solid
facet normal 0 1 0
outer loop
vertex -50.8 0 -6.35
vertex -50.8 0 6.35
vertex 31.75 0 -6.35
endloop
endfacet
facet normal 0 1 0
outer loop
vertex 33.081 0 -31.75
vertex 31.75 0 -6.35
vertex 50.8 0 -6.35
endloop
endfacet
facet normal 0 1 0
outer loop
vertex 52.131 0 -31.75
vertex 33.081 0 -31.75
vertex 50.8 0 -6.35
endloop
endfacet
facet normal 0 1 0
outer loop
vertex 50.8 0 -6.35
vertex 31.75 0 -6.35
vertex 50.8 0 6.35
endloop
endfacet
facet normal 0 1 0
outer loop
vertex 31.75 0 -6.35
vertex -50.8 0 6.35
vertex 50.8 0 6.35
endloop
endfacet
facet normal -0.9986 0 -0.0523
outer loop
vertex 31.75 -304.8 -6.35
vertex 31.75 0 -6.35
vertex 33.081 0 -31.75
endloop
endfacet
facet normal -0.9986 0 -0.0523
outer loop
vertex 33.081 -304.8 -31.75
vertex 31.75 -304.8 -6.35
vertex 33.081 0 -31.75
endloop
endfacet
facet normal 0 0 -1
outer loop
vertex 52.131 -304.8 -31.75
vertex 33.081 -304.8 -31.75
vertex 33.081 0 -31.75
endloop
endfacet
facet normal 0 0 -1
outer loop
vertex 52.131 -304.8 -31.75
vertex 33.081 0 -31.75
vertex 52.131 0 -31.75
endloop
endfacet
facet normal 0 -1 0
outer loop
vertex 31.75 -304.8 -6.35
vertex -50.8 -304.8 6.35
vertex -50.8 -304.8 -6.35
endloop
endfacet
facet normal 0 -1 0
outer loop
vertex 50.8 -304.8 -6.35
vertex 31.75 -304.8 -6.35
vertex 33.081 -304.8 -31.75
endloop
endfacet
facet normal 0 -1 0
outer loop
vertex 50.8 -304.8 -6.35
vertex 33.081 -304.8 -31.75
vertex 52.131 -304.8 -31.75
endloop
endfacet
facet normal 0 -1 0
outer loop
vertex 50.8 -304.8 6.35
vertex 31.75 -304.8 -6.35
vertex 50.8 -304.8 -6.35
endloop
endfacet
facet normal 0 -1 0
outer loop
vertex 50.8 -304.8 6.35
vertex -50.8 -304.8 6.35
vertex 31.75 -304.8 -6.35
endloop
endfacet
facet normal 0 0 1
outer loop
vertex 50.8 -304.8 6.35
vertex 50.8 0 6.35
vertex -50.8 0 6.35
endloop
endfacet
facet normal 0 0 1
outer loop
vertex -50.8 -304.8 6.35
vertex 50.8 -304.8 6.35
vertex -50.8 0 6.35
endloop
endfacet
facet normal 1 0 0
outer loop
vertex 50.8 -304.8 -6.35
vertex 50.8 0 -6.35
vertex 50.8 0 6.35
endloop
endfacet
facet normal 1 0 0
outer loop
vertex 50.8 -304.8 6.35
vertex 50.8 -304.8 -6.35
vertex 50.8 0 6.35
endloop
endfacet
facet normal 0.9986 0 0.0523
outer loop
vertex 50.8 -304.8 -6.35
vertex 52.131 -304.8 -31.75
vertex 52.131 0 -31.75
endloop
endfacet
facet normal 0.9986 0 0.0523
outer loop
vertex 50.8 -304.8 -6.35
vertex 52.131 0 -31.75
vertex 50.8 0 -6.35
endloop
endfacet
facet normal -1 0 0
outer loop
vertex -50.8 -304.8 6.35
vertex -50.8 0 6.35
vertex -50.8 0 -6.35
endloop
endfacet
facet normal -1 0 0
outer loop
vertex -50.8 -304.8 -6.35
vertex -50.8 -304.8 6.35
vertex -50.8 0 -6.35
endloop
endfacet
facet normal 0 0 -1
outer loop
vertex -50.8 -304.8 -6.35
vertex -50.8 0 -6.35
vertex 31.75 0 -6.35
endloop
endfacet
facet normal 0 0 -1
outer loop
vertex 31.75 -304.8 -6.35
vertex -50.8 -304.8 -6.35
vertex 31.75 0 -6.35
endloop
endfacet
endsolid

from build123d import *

# Parameters (mm, degrees)
F1_DEPTH = 304.8
F2_DEPTH = 304.8


with BuildPart() as f1:
    # F0 (on Front) → F1 (new body)
    with BuildSketch(Plane.XZ):
        Polygon((31.75, -6.35), (50.8, -6.35), (50.8, 6.35), (-50.8, 6.35), (-50.8, -6.35), align=None)
    extrude(amount=F1_DEPTH)

    # F0 (on Front) → F2 (join)
    with BuildSketch(Plane.XZ):
        Polygon((52.131158, -31.75), (50.8, -6.35), (31.75, -6.35), (33.081158, -31.75), align=None)
    extrude(amount=F2_DEPTH)


solid = f1.part
